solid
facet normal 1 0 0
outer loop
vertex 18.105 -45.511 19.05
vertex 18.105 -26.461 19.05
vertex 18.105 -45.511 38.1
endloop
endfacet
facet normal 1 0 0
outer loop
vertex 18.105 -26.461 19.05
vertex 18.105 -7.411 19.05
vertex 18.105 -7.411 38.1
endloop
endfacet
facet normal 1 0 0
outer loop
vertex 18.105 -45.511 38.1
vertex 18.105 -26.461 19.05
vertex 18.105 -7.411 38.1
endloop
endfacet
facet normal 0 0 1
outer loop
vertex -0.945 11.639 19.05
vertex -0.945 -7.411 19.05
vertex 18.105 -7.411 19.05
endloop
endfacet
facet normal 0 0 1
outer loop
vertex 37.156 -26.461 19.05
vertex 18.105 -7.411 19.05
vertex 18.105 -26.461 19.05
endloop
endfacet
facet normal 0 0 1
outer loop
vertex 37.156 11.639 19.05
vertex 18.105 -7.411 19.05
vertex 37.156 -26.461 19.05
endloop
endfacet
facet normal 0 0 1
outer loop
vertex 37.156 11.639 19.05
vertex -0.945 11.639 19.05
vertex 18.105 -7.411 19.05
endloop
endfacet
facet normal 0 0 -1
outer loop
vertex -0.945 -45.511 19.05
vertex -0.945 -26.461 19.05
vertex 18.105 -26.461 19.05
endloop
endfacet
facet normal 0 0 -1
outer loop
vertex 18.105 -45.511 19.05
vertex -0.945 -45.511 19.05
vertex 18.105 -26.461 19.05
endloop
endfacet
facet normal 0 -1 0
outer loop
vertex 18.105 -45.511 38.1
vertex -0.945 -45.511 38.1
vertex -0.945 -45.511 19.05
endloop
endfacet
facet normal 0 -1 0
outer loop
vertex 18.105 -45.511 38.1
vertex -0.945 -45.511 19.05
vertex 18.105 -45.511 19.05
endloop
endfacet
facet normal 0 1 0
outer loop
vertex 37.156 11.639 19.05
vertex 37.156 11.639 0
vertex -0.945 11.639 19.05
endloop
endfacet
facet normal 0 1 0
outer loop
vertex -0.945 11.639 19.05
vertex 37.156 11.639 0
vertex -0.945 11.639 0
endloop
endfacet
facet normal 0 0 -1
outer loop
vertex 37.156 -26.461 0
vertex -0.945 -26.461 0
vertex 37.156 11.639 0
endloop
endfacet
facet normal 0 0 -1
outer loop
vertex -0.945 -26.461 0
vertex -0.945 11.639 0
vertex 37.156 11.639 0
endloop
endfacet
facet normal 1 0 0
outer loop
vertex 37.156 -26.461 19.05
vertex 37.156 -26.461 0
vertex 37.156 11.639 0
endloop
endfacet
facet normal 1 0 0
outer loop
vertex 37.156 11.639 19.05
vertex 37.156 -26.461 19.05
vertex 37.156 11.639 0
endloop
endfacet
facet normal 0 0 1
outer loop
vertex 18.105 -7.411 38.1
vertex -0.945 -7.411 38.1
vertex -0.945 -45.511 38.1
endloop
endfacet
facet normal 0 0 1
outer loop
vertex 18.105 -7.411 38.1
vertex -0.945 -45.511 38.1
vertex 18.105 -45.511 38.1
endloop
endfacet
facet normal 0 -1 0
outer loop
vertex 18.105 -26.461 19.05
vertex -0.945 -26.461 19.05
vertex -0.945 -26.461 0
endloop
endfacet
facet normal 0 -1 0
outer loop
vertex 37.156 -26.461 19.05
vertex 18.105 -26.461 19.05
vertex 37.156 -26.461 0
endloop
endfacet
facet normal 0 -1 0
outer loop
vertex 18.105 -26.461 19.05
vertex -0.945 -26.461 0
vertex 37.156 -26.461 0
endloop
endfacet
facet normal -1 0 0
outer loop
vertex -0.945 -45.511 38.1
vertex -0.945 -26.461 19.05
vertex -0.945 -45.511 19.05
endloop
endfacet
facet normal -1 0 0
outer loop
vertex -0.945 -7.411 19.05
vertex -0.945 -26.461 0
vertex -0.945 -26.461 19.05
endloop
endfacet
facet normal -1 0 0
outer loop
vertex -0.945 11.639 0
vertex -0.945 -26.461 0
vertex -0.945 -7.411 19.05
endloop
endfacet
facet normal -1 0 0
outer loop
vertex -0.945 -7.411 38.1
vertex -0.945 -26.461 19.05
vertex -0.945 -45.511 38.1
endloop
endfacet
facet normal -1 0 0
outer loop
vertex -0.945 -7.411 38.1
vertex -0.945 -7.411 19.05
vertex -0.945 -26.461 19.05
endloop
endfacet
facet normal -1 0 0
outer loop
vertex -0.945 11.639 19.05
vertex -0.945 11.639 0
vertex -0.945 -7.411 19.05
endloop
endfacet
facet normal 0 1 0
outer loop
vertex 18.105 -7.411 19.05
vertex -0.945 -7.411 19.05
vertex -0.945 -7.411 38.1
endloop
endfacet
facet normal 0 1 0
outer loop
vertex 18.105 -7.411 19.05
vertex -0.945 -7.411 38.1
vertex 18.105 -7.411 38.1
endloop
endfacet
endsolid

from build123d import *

# Parameters (mm, degrees)
F0_W     = 19.051107
F0_H     = 19.05
F0_W_2   = 19.05
F1_DEPTH = 19.05
F2_DEPTH = 38.1
F3_W     = 19.05
F3_H     = 19.05
F4_DEPTH = 19.05


with BuildPart() as f1:
    # F0 (on Top) → F1 (new body)
    with BuildSketch(Plane.XY):
        with Locations((27.630415, 2.113701)):
            Rectangle(F0_W, F0_H)
        with Locations((8.579862, 2.113701)):
            Rectangle(F0_W_2, F0_H)
        with Locations((27.630415, -16.936299)):
            Rectangle(F0_W, F0_H)
    extrude(amount=F1_DEPTH)

    # F0 (on Top) → F2 (join)
    with BuildSketch(Plane.XY):
        with Locations((8.579862, -16.936299)):
            Rectangle(F0_W_2, F0_H)
    extrude(amount=F2_DEPTH)

    # F3 (on face) → F4 (join)
    with BuildSketch(Plane.XZ.offset(26.461299)):
        with Locations((8.579862, 28.575)):
            Rectangle(F3_W, F3_H)
    extrude(amount=F4_DEPTH)


solid = f1.part
